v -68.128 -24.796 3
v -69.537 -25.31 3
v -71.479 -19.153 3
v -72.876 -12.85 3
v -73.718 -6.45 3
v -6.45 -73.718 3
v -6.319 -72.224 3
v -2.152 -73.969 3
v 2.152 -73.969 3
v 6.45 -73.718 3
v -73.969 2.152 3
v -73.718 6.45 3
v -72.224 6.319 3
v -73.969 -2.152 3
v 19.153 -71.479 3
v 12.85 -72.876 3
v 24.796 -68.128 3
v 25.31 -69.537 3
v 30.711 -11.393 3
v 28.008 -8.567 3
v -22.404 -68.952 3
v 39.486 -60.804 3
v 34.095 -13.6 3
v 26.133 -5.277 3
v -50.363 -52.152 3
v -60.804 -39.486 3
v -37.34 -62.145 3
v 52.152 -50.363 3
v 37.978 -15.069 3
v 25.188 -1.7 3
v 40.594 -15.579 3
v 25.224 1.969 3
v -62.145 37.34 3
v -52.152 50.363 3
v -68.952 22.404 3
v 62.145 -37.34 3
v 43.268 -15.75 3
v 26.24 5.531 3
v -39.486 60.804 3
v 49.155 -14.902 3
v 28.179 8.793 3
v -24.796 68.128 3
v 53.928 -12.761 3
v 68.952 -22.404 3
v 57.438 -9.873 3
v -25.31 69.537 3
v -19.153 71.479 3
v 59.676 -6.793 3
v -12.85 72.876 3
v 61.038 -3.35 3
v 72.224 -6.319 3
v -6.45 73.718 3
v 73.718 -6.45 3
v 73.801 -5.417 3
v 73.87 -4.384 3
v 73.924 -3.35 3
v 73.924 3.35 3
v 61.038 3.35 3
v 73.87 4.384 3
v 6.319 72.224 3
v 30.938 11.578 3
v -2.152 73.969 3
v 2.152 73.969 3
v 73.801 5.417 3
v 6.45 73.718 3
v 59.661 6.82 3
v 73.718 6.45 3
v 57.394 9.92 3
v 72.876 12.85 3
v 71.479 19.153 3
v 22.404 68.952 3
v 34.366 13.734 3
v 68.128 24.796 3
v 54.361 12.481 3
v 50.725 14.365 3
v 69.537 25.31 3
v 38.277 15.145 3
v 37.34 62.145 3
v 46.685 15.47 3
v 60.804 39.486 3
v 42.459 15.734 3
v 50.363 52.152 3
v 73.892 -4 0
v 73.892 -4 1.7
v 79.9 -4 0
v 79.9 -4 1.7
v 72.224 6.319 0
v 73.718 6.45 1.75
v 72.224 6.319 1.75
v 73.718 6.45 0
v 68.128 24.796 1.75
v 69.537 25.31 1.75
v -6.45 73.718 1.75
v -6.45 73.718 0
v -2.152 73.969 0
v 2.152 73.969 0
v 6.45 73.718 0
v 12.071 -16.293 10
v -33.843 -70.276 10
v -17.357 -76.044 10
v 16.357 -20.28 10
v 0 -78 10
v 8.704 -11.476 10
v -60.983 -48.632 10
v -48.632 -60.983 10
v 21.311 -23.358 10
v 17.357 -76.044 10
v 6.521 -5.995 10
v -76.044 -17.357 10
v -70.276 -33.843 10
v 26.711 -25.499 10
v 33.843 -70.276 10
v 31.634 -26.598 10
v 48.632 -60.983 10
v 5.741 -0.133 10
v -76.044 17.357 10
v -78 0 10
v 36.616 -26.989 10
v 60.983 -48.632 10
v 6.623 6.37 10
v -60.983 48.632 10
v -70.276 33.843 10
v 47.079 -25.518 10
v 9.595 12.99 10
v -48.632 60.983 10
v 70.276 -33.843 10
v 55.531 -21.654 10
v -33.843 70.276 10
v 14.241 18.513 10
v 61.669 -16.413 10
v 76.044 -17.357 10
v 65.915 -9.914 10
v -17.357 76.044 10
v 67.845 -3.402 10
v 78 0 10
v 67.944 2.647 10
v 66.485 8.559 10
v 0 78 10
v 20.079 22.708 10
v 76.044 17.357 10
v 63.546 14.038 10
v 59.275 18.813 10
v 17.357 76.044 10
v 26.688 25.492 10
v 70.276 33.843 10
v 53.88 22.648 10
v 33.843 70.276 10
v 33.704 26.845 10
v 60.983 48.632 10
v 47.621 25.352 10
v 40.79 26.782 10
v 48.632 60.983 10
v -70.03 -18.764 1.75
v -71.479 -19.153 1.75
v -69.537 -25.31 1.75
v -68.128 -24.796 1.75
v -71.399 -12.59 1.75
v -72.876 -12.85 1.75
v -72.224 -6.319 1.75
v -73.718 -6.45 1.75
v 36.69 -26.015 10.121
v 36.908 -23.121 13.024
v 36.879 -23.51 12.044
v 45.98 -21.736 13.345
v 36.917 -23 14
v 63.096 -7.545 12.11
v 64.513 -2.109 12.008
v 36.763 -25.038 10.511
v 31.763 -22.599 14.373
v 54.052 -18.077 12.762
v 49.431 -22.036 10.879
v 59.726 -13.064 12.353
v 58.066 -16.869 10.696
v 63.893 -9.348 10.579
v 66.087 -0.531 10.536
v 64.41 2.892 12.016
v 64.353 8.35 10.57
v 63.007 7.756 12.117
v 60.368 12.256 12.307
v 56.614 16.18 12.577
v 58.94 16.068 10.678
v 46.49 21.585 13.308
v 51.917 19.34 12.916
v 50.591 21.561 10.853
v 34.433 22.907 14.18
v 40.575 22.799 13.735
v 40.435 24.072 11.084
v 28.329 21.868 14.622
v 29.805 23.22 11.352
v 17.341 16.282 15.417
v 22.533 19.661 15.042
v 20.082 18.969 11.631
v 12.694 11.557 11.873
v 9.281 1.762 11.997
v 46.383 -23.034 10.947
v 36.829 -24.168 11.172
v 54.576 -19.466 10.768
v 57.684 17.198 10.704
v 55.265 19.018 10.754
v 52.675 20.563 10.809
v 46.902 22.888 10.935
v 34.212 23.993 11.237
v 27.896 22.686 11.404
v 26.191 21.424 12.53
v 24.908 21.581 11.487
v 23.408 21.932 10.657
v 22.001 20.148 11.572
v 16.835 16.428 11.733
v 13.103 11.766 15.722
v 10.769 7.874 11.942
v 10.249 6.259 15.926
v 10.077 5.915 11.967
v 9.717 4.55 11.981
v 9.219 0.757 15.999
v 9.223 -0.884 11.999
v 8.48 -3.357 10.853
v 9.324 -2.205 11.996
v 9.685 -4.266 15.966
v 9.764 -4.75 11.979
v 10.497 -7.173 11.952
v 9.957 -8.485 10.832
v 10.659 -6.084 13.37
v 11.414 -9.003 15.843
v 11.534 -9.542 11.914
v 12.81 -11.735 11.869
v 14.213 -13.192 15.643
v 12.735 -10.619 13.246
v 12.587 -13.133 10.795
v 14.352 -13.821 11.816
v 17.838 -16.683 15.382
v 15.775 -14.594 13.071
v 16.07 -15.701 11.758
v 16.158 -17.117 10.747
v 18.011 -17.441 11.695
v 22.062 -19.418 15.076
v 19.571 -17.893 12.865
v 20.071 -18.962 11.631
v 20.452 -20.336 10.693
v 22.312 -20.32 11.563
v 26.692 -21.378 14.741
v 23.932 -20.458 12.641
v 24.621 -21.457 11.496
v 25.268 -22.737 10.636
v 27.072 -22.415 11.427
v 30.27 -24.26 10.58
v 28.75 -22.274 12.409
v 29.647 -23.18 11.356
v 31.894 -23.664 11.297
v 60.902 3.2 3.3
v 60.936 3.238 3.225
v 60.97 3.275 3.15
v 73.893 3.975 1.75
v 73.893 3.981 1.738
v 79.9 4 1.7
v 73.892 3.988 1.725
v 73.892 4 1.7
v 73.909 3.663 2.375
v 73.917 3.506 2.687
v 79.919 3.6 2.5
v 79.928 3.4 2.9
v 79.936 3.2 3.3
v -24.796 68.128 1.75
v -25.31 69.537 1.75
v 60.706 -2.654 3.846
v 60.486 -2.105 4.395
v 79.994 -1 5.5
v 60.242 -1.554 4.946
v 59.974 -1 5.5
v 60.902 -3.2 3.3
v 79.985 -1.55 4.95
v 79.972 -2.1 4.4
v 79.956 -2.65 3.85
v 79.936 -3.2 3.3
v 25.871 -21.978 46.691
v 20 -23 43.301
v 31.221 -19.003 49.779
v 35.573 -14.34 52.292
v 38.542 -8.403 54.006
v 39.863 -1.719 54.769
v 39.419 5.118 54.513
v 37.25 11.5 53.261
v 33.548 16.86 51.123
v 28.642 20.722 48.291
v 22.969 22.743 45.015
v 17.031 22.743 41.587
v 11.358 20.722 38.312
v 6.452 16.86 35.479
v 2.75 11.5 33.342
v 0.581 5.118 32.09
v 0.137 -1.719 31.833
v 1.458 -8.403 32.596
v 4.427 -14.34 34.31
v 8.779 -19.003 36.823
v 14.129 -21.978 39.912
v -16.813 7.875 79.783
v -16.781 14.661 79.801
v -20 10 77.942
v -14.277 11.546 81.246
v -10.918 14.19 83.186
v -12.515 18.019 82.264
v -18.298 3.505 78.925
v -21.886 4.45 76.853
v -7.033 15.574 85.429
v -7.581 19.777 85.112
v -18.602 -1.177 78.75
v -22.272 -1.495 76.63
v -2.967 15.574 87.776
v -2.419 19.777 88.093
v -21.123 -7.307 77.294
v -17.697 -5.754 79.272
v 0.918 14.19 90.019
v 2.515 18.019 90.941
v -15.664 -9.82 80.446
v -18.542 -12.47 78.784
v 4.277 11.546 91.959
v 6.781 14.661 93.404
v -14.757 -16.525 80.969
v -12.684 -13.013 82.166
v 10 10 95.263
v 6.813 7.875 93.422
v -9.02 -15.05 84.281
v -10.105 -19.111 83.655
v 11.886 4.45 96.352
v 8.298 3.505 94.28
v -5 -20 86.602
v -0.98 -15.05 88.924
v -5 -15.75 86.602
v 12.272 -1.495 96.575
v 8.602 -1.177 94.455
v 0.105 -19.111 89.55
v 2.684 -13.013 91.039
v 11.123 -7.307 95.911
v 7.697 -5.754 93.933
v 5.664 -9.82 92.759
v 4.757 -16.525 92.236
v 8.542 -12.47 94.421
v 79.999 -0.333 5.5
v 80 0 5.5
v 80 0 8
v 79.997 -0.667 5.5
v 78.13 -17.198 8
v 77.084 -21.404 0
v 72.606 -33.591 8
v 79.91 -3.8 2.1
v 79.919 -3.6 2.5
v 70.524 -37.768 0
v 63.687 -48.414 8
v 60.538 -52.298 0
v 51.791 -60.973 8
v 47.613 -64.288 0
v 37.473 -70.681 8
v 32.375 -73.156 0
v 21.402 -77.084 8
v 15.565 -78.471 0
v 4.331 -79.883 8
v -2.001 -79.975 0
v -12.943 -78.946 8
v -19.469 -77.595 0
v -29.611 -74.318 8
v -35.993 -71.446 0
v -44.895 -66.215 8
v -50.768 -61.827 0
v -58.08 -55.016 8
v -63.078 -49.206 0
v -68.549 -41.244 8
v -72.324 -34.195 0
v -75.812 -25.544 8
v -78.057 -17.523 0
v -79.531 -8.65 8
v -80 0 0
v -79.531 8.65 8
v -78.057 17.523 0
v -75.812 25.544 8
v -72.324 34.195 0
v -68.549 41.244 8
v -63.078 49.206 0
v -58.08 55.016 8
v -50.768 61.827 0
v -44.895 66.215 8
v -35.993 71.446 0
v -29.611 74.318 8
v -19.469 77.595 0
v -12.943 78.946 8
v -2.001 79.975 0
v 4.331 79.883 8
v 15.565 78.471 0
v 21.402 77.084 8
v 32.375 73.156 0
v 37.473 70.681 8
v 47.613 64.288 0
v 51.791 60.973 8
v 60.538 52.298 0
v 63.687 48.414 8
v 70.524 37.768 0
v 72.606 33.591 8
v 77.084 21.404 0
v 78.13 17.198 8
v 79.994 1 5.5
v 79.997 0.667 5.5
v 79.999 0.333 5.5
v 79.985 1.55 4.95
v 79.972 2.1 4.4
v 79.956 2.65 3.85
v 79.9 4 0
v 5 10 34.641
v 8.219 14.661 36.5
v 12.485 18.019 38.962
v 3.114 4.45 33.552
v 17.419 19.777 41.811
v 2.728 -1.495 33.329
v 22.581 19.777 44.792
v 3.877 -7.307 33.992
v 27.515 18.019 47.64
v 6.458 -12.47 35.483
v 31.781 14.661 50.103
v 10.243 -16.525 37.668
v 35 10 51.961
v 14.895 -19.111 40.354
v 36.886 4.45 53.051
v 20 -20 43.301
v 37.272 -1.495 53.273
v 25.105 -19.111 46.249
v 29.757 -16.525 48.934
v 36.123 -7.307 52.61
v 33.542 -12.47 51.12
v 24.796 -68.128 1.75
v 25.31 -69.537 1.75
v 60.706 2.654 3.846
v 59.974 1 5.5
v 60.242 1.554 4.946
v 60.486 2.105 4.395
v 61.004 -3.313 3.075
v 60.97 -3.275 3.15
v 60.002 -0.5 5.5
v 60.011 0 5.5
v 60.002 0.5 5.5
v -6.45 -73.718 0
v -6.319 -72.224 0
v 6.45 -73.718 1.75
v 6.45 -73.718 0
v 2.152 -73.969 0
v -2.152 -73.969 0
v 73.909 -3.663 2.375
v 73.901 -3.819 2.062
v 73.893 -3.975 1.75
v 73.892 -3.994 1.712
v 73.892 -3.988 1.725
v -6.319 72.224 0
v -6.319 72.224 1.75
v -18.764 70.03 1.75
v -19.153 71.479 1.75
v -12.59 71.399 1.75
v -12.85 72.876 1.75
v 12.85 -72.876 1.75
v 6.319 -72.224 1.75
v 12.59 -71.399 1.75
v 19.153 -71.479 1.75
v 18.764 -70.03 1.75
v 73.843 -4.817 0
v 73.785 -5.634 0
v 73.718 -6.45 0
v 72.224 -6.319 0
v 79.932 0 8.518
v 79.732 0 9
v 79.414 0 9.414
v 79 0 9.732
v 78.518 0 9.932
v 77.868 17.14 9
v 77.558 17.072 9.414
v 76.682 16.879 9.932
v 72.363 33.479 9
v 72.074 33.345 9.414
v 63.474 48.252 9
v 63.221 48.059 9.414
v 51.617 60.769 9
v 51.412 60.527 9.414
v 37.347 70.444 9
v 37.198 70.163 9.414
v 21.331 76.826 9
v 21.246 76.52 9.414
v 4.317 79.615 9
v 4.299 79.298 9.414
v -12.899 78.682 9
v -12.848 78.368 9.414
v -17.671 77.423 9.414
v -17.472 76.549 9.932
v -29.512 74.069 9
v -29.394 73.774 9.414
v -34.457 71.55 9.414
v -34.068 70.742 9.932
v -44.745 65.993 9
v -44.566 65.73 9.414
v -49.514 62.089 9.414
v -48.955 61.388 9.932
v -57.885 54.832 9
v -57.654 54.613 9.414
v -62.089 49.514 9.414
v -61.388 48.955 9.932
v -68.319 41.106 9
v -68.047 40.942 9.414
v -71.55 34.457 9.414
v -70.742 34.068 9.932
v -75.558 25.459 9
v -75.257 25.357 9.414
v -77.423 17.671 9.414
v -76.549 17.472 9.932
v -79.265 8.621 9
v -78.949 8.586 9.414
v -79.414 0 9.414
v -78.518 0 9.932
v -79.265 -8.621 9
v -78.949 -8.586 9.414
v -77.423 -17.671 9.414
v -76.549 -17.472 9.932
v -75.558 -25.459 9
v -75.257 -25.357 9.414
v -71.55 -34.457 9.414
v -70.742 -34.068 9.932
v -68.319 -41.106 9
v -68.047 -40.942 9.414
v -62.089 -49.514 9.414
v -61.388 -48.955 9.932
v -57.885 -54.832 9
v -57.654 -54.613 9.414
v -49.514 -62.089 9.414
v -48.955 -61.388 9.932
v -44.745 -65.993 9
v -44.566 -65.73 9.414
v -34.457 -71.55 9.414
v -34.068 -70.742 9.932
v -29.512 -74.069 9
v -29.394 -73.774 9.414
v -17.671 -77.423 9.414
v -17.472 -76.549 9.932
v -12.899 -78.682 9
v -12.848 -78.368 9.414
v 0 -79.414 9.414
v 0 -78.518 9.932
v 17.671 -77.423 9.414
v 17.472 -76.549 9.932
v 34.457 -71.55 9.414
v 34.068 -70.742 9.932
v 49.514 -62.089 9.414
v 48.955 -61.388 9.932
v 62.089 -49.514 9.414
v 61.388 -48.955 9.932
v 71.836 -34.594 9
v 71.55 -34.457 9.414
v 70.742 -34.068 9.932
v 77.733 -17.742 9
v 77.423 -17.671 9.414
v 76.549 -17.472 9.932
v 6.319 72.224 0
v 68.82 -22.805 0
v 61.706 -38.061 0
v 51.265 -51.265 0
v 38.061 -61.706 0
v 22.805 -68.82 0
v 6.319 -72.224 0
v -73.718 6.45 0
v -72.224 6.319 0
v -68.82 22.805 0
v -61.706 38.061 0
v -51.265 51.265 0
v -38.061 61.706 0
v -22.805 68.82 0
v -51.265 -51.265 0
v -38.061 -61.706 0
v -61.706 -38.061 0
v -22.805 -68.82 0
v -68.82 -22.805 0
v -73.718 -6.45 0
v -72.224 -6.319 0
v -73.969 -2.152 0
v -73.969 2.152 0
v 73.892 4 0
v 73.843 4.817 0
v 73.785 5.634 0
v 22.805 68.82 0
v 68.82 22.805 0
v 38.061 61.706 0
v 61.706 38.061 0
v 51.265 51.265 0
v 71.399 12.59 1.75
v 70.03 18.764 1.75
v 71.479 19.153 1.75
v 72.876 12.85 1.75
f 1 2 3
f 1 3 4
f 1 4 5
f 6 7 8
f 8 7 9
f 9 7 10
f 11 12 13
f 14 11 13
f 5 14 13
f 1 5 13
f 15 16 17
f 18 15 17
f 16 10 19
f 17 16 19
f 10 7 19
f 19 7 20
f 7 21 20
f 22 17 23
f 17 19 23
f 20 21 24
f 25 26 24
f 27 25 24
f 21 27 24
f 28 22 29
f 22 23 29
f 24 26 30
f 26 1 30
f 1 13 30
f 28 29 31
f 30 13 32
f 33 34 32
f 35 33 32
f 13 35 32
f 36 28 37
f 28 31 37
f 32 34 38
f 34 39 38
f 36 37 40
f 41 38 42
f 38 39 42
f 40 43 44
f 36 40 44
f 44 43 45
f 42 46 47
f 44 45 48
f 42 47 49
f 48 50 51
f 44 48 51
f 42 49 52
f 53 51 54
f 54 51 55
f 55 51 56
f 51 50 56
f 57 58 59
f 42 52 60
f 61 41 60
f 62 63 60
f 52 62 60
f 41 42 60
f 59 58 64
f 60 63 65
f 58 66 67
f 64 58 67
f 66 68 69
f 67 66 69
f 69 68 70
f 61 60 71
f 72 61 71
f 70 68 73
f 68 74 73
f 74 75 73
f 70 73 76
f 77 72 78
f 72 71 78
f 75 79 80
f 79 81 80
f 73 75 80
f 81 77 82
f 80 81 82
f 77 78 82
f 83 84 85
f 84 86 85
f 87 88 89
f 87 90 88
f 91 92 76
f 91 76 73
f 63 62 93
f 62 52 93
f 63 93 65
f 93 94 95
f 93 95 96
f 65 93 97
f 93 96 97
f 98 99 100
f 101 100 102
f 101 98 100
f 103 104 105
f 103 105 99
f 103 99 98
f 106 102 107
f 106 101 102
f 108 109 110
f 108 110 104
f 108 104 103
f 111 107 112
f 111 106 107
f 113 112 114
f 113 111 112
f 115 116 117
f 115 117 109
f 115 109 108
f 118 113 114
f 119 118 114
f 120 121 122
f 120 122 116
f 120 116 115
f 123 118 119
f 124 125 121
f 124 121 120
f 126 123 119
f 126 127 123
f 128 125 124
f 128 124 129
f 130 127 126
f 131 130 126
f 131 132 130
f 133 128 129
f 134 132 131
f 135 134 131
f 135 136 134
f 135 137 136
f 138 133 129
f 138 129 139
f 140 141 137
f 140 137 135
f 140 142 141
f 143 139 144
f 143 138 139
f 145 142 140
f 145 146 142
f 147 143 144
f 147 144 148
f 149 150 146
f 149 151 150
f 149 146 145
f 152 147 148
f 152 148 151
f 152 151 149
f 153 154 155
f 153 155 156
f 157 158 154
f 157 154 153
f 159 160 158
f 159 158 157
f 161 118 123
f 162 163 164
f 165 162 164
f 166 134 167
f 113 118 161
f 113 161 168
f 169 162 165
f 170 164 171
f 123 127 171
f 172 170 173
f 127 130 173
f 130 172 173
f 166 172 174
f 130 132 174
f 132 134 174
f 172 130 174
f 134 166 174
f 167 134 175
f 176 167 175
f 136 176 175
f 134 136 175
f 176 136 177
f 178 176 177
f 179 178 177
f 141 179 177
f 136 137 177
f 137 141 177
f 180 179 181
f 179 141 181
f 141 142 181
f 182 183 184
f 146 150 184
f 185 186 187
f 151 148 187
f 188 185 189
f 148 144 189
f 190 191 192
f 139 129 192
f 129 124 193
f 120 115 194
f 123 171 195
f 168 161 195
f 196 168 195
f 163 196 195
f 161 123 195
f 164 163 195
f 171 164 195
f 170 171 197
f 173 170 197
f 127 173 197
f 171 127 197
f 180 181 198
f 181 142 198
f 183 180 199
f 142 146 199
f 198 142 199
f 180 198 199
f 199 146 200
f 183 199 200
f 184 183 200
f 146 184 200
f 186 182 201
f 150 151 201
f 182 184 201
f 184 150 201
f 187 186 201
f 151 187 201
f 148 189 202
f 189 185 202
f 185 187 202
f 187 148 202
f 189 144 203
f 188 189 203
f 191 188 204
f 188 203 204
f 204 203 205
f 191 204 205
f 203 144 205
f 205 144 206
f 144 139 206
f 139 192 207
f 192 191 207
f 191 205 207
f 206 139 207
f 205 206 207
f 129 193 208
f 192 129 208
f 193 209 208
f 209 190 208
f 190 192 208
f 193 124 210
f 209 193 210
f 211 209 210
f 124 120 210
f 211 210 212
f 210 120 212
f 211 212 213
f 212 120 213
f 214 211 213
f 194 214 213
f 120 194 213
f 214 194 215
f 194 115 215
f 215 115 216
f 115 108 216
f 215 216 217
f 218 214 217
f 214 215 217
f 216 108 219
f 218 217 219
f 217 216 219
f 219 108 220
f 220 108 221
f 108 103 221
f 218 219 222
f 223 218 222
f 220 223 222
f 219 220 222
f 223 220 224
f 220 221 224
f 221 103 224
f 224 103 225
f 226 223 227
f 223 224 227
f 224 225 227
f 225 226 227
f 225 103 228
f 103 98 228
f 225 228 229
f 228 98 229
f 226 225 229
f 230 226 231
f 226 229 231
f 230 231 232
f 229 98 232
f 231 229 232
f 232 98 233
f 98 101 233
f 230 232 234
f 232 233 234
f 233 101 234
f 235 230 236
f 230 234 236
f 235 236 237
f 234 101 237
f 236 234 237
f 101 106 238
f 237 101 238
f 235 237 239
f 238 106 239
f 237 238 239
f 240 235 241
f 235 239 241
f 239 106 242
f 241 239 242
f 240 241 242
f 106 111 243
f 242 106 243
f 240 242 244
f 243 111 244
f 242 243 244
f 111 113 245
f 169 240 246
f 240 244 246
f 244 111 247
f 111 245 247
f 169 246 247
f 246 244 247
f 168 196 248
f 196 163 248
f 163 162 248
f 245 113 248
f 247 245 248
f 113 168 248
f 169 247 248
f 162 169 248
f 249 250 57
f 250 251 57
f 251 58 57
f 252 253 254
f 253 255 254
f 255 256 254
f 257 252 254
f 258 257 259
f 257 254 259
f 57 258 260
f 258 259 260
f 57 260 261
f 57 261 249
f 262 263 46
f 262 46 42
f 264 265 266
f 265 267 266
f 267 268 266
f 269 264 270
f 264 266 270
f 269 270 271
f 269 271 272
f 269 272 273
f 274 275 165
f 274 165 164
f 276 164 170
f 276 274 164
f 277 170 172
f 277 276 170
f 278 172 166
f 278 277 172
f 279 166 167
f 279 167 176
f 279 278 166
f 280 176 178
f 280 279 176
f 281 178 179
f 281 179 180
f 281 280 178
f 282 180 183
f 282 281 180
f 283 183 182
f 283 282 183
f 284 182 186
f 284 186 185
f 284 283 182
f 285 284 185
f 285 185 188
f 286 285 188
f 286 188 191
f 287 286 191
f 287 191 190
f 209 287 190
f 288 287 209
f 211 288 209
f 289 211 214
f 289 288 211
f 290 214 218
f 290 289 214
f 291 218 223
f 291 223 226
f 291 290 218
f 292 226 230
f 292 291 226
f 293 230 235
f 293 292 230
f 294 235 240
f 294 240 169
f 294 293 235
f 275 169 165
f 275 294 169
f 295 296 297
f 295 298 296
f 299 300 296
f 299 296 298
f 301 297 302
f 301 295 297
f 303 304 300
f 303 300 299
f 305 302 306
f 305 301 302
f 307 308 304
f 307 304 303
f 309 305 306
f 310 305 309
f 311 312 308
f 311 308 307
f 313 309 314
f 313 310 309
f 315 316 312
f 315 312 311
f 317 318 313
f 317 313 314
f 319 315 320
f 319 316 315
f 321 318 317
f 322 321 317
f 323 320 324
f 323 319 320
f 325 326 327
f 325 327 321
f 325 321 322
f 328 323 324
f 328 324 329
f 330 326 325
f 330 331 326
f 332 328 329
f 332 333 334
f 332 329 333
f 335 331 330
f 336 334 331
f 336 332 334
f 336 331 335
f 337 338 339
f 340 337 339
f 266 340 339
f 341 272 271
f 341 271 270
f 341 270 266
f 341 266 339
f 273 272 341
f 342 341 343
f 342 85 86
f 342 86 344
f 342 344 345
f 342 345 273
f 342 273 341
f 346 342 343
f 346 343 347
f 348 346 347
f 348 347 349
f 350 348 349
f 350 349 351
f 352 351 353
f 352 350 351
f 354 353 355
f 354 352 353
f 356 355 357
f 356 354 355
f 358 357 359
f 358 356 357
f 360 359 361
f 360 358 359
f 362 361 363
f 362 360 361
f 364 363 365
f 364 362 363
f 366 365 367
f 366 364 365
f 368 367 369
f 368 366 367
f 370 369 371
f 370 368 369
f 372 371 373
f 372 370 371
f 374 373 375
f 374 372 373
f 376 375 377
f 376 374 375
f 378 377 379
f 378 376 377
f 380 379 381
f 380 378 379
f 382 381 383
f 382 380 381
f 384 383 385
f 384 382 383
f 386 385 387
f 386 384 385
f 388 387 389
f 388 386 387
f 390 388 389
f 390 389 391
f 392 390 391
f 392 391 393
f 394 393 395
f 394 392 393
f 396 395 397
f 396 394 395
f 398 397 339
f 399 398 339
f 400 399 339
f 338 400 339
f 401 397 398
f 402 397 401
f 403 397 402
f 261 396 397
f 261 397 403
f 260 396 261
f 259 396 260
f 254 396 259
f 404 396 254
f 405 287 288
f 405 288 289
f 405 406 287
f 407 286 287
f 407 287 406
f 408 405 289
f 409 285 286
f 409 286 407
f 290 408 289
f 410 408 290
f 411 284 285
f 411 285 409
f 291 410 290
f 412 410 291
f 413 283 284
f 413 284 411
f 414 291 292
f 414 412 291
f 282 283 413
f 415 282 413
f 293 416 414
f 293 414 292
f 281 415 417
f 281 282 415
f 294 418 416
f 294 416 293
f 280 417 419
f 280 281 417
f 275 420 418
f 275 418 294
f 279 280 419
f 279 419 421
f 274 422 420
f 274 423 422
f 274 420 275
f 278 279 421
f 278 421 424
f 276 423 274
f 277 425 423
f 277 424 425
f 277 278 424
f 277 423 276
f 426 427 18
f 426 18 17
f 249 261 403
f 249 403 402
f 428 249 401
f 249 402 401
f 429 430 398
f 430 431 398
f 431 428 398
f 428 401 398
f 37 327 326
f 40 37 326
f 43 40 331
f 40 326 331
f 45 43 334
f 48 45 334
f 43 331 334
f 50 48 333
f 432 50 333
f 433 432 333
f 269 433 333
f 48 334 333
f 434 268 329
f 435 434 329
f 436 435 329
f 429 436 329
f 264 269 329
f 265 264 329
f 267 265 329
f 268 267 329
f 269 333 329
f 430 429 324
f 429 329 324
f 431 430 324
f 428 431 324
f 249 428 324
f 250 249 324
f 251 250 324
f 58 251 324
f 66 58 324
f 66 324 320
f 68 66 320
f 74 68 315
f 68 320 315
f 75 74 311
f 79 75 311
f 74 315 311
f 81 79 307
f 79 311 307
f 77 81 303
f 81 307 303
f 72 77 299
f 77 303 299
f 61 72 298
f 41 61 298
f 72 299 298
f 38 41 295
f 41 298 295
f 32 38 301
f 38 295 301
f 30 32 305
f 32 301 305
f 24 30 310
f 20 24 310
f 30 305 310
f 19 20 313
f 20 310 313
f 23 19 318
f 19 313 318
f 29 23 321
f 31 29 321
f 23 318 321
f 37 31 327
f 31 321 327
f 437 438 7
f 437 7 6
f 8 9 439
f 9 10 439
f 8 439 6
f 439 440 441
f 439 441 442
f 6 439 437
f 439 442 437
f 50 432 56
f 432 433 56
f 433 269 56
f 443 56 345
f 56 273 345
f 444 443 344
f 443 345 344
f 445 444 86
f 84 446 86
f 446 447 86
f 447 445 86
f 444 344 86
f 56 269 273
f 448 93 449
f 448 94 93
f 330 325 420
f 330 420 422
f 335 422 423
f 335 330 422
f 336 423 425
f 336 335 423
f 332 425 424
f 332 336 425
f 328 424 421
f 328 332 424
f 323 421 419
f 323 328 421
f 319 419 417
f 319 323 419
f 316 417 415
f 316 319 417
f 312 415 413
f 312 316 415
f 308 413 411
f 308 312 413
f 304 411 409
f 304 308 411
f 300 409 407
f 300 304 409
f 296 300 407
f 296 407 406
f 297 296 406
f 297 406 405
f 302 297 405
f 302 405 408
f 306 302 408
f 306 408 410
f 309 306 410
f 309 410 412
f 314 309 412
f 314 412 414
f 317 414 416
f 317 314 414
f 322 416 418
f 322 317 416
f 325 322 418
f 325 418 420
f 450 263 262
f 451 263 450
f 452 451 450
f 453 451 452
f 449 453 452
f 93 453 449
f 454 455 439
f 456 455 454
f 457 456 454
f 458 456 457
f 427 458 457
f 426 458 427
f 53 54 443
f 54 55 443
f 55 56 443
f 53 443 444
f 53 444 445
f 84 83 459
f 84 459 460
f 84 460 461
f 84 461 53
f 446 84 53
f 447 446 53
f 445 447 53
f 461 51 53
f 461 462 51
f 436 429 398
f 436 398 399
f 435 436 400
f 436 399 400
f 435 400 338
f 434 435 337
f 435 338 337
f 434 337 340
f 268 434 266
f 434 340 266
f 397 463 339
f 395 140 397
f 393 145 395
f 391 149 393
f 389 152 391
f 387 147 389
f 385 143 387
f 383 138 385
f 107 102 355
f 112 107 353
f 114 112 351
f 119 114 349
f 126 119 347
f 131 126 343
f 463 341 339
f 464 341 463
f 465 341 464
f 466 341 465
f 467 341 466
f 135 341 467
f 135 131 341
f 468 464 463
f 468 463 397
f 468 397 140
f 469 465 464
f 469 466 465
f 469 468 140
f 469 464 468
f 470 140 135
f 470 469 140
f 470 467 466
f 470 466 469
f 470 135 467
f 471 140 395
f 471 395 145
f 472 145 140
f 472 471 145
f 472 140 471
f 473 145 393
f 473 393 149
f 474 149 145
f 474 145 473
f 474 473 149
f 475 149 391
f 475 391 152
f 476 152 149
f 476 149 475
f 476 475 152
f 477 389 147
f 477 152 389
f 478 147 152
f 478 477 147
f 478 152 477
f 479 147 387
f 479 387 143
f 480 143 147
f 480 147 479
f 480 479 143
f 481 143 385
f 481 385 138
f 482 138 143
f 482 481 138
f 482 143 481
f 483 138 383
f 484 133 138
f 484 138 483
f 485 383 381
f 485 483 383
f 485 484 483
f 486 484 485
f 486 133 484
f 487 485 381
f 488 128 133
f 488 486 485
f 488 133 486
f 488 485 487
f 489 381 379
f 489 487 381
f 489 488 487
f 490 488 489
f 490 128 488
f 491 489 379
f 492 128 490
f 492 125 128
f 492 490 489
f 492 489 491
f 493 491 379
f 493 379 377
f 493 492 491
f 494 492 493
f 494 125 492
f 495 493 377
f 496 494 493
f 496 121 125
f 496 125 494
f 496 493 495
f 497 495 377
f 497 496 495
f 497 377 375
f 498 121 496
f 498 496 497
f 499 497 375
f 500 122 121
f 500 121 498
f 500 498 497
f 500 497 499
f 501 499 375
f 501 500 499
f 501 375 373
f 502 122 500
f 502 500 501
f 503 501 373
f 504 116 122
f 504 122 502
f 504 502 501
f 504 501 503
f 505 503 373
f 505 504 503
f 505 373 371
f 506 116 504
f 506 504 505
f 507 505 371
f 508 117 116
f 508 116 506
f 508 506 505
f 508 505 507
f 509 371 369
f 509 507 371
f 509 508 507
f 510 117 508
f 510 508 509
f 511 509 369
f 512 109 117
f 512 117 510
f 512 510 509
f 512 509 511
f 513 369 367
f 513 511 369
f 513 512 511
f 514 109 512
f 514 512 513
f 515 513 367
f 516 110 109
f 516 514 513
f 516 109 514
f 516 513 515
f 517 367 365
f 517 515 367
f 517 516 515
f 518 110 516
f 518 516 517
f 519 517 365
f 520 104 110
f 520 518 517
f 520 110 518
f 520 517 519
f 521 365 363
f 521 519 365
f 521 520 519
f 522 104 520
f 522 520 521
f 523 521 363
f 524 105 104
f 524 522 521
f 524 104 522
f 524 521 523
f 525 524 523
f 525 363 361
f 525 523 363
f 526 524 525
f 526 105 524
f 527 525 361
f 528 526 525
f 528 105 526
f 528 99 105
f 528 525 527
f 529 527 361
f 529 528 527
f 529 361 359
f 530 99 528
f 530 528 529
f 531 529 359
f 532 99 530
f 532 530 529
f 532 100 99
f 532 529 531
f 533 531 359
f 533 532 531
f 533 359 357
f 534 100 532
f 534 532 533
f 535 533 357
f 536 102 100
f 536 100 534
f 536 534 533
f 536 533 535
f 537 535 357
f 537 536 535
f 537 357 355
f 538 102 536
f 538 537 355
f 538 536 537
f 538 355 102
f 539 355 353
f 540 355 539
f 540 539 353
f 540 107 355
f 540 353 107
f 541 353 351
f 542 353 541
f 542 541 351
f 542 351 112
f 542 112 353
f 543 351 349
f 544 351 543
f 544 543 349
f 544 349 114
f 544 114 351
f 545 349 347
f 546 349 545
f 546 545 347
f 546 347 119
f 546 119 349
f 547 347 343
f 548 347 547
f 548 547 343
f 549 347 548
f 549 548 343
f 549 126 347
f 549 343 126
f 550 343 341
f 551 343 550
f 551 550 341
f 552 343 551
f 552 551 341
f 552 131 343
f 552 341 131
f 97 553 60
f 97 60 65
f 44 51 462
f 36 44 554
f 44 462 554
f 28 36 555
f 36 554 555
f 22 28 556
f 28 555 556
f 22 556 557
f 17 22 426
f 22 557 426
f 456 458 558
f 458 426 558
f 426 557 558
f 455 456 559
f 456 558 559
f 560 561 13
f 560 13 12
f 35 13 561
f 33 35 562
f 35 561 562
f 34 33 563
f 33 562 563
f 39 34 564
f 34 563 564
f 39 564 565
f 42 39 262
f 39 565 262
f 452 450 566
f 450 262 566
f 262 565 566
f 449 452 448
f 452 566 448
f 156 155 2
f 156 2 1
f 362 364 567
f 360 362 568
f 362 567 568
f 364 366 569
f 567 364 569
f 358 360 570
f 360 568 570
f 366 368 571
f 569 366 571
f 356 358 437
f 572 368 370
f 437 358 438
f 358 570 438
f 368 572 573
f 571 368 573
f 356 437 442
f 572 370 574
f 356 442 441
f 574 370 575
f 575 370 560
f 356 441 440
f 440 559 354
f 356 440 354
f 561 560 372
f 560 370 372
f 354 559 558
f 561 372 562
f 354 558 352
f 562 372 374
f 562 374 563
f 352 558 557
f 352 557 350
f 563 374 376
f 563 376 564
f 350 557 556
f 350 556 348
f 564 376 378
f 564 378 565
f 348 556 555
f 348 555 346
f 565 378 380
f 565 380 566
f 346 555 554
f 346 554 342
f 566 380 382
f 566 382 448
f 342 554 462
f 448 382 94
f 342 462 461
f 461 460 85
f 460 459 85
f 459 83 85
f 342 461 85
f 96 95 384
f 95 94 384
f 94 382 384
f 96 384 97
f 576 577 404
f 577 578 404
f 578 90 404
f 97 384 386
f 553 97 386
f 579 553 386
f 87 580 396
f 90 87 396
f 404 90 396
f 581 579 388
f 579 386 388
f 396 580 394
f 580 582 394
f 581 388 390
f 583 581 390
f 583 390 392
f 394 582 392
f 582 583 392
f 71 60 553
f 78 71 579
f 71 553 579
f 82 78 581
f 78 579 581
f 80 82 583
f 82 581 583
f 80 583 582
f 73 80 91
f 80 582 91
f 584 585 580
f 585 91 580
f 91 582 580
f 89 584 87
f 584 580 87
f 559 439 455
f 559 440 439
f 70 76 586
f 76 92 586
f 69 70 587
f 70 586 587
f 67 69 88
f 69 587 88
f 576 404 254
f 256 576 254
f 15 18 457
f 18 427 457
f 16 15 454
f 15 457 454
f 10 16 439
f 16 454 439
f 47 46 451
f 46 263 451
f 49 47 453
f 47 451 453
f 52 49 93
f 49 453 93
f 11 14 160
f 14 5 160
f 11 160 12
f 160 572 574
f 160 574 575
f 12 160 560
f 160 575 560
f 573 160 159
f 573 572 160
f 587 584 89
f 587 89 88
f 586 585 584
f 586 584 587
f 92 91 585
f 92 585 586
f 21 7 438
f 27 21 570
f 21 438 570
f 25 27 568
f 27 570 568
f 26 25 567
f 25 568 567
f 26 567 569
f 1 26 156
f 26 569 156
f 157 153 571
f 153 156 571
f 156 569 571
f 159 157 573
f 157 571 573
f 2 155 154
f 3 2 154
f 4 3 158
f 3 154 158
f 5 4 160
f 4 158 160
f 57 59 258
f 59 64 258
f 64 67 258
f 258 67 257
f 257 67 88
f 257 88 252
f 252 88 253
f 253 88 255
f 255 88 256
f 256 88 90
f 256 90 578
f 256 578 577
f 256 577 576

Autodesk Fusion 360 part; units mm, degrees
sketch "Skizze1" plane through (0, 0, 0) normal (0, 0, 1) x (1, 0, 0)
  circle A0 centre (0, 0) radius 80
extrude "Extrusion1" add sketch "Skizze1" along normal blind 10 makes body 1
fillet "Abrundung1" radius 2 1 edges at (-74.5862, -28.9292, 10) on bodies 1
sketch "Skizze2" plane through (0, 0, 0) normal (0, 1, 0) x (1, 0, 0)
  line L0 (45, 0) -> (-5, -86.6025) construction
ref_plane "Arbeitsebene1" through (-5, 0, 86.6025) normal (-0.5, 0, 0.866) x (0, -1, 0)
sketch "Skizze3" plane through (-5, 0, 86.6025) normal (-0.5, 0, 0.866) x (0, -1, 0)
  circle A0 centre (0, 0) radius 23
  circle A1 centre (0, 0) radius 20
extrude "Extrusion5" add sketch "Skizze3" against normal blind 110 separate body contours A0 | A1 makes body 2
combine "Kombinieren1" operation add target body 1 tool bodies 2
extrude "Extrusion6" cut sketch "Skizze3" against normal blind 50 bodies 1
fillet "Abrundung2" radius 4 3 edges at (65.7846, 0, 10) (-74.5862, -28.9292, 8) (-72.7215, 28.206, 10) on bodies 1
sketch "Skizze4" plane through (-5, 0, 86.6025) normal (-0.5, 0, 0.866) x (0, -1, 0)
  circle A0 centre (0, 0) radius 15.75
extrude "Extrusion7" cut sketch "Skizze4" against normal blind 110 bodies 1
sketch "Skizze5" plane through (0, 0, 0) normal (0, 0, 1) x (1, 0, 0)
  circle A0 centre (0, 0) radius 160
extrude "Extrusion8" cut sketch "Skizze5" against normal blind 110 bodies 1
sketch "Skizze6" plane through (0, 0, 0) normal (0, 0, 1) x (1, 0, 0)
  line L0 (45, 0) -> (85, 0)
ref_plane "Arbeitsebene2" through (45, 0, 0) normal (1, 0, 0) x (0, 1, 0)
sketch "Skizze7" plane through (45, 0, 0) normal (1, 0, 0) x (0, 1, 0)
  line L0 (-4, 0) -> (-4, 1.7)
  line L1 (-4, 1.7) -> (-3.2, 3.3)
  line L2 (-3.2, 3.3) -> (-1, 5.5)
  line L3 (-1, 5.5) -> (1, 5.5)
  line L4 (1, 5.5) -> (3.2, 3.3)
  line L5 (3.2, 3.3) -> (4, 1.7)
  line L6 (4, 1.7) -> (4, 0)
  line L7 (4, 0) -> (-4, 0)
sweep "Sweeping1" cut profiles "Skizze7" path "Skizze6" along L0 section 1 bodies 1
sketch "Skizze8" plane through (0, 0, 0) normal (0, 0, 1) x (1, 0, 0)
  circle A0 centre (0, 0) radius 72.5
extrude "Extrusion9" cut sketch "Skizze8" along normal blind 3 bodies 1
sketch "Skizze9" plane through (0, 0, 0) normal (0, 0, 1) x (1, 0, 0)
  line L0 (72.2241, -6.3188) -> (73.7184, -6.4495)
  arc A0 (73.7184, -6.4495) -> (73.7184, 6.4495) centre (0, 0) ccw
  line L1 (73.7184, 6.4495) -> (72.2241, 6.3188)
  arc A1 (72.2241, -6.3188) -> (72.2241, 6.3188) centre (0, 0) ccw
  line L2 (6.3188, 72.2241) -> (6.4495, 73.7184)
  arc A2 (6.4495, 73.7184) -> (-6.4495, 73.7184) centre (0, 0) ccw
  line L3 (-6.4495, 73.7184) -> (-6.3188, 72.2241)
  arc A3 (6.3188, 72.2241) -> (-6.3188, 72.2241) centre (0, 0) ccw
  line L4 (-72.2241, 6.3188) -> (-73.7184, 6.4495)
  arc A4 (-73.7184, 6.4495) -> (-73.7184, -6.4495) centre (0, 0) ccw
  line L5 (-73.7184, -6.4495) -> (-72.2241, -6.3188)
  arc A5 (-72.2241, 6.3188) -> (-72.2241, -6.3188) centre (0, 0) ccw
  line L6 (-6.3188, -72.2241) -> (-6.4495, -73.7184)
  arc A6 (-6.4495, -73.7184) -> (6.4495, -73.7184) centre (0, 0) ccw
  line L7 (6.4495, -73.7184) -> (6.3188, -72.2241)
  arc A7 (-6.3188, -72.2241) -> (6.3188, -72.2241) centre (0, 0) ccw
extrude "Extrusion10" cut sketch "Skizze9" along normal blind 3 bodies 1
sketch "Skizze10" plane through (0, 0, 0) normal (0, 0, 1) x (1, 0, 0)
  line L0 (72.2241, -6.3188) -> (73.7184, -6.4495)
  arc A0 (73.7184, -6.4495) -> (69.5373, 25.3095) centre (0, 0) ccw
  line L1 (69.5373, 25.3095) -> (68.1277, 24.7965)
  arc A1 (72.2241, -6.3188) -> (68.1277, 24.7965) centre (0, 0) ccw
  line L2 (6.3188, 72.2241) -> (6.4495, 73.7184)
  arc A2 (6.4495, 73.7184) -> (-25.3095, 69.5373) centre (0, 0) ccw
  line L3 (-25.3095, 69.5373) -> (-24.7965, 68.1277)
  arc A3 (6.3188, 72.2241) -> (-24.7965, 68.1277) centre (0, 0) ccw
  line L4 (-72.2241, 6.3188) -> (-73.7184, 6.4495)
  arc A4 (-73.7184, 6.4495) -> (-69.5373, -25.3095) centre (0, 0) ccw
  line L5 (-69.5373, -25.3095) -> (-68.1277, -24.7965)
  arc A5 (-72.2241, 6.3188) -> (-68.1277, -24.7965) centre (0, 0) ccw
  line L6 (-6.3188, -72.2241) -> (-6.4495, -73.7184)
  arc A6 (-6.4495, -73.7184) -> (25.3095, -69.5373) centre (0, 0) ccw
  line L7 (25.3095, -69.5373) -> (24.7965, -68.1277)
  arc A7 (-6.3188, -72.2241) -> (24.7965, -68.1277) centre (0, 0) ccw
extrude "Extrusion11" cut sketch "Skizze10" along normal blind 1.25 from surface at 1.75 bodies 1
sketch "Skizze11" plane through (0, 0, 0) normal (0, 0, 1) x (1, 0, 0)
  circle A0 centre (0, 0) radius 72.2
extrude "Extrusion12" add sketch "Skizze11" along normal blind 3 separate body makes body 3
fillet "Abrundung3" radius 0.5 1 edges at (-67.314, -26.1086, 3) on bodies 3
sketch "Skizze12" plane through (0, 0, 0) normal (0, 0, 1) x (1, 0, 0)
  line L0 (71.0266, -4.9667) -> (73.5205, -5.1411)
  arc A0 (73.5205, -5.1411) -> (73.5205, 5.1411) centre (0, 0) ccw
  line L1 (73.5205, 5.1411) -> (71.0266, 4.9667)
  arc A1 (71.0266, -4.9667) -> (71.0266, 4.9667) centre (0, 0) ccw
  line L2 (4.9667, 71.0266) -> (5.1411, 73.5205)
  arc A2 (5.1411, 73.5205) -> (-5.1411, 73.5205) centre (0, 0) ccw
  line L3 (-5.1411, 73.5205) -> (-4.9667, 71.0266)
  arc A3 (4.9667, 71.0266) -> (-4.9667, 71.0266) centre (0, 0) ccw
  line L4 (-71.0266, 4.9667) -> (-73.5205, 5.1411)
  arc A4 (-73.5205, 5.1411) -> (-73.5205, -5.1411) centre (0, 0) ccw
  line L5 (-73.5205, -5.1411) -> (-71.0266, -4.9667)
  arc A5 (-71.0266, 4.9667) -> (-71.0266, -4.9667) centre (0, 0) ccw
  line L6 (-4.9667, -71.0266) -> (-5.1411, -73.5205)
  arc A6 (-5.1411, -73.5205) -> (5.1411, -73.5205) centre (0, 0) ccw
  line L7 (5.1411, -73.5205) -> (4.9667, -71.0266)
  arc A7 (-4.9667, -71.0266) -> (4.9667, -71.0266) centre (0, 0) ccw
extrude "Extrusion13" add sketch "Skizze12" along normal blind 1.1 from surface at 1.9 separate body makes body 4 at (72.7424, 3.9409, 1.9) makes body 5 at (-72.7424, 3.9409, 1.9) makes body 6 at (-3.9409, 72.7424, 1.9) makes body 7 at (0.5522, -72.8469, 1.9)
combine "Kombinieren2" operation add target body 3 tool bodies 4 5 6 7
sketch "Skizze13" plane through (0, 0, 0) normal (0, 0, 1) x (1, 0, 0)
  circle A0 centre (0, 39.875) radius 9
  circle A1 centre (0, -39.875) radius 9
extrude "Extrusion14" cut sketch "Skizze13" along normal blind 3 bodies 3
delete_body "Körper entfernen1" bodies 3
equation "base_plate_diameter = 160 mm"
equation "base_plate_height = 10 mm"
equation "base_plate_rounding = 2 mm"
equation "leg_outer_diameter = 46 mm"
equation "ring_inner_diameter = 40 mm"
equation "ring_extrude_depth = 50 mm"
equation "hole_inner_diameter = 31.5 mm"
equation "leg_length = 100 mm"
equation "leg_angle = 120 deg"
equation "leg_offset = 45 mm"
equation "leg_plate_rounding = 4 mm"
equation "cable_channel_width = 8 mm"
equation "cable_channel_depth = 5.5 mm"
equation "cable_channel_vertical_height = 2.5 mm"
equation "cable_channel_edge_chamfer = 0.8 mm"
equation "cover_plate_diameter = 145 mm"
equation "cover_plate_thickness = 3 mm"
equation "finger_grip_diameter = 18 mm"
equation "finger_grip_depth = 1.5 mm"
equation "clamp_recess_width = 22 mm"
equation "clamp_recess_length = 12 mm"
equation "clamp_recess_depth = 2.5 mm"
equation "strain_relief_screw_diameter = 2.6 mm"
equation "strain_relief_screw_depth = 6 mm"
equation "d25 = base_plate_height"
equation "d28 = base_plate_rounding"
equation "d41 = leg_plate_rounding"
equation "d53 = cover_plate_thickness"
equation "d55 = cover_plate_thickness"
equation "d60 = cover_plate_thickness"
equation "d67 = cover_plate_thickness"
